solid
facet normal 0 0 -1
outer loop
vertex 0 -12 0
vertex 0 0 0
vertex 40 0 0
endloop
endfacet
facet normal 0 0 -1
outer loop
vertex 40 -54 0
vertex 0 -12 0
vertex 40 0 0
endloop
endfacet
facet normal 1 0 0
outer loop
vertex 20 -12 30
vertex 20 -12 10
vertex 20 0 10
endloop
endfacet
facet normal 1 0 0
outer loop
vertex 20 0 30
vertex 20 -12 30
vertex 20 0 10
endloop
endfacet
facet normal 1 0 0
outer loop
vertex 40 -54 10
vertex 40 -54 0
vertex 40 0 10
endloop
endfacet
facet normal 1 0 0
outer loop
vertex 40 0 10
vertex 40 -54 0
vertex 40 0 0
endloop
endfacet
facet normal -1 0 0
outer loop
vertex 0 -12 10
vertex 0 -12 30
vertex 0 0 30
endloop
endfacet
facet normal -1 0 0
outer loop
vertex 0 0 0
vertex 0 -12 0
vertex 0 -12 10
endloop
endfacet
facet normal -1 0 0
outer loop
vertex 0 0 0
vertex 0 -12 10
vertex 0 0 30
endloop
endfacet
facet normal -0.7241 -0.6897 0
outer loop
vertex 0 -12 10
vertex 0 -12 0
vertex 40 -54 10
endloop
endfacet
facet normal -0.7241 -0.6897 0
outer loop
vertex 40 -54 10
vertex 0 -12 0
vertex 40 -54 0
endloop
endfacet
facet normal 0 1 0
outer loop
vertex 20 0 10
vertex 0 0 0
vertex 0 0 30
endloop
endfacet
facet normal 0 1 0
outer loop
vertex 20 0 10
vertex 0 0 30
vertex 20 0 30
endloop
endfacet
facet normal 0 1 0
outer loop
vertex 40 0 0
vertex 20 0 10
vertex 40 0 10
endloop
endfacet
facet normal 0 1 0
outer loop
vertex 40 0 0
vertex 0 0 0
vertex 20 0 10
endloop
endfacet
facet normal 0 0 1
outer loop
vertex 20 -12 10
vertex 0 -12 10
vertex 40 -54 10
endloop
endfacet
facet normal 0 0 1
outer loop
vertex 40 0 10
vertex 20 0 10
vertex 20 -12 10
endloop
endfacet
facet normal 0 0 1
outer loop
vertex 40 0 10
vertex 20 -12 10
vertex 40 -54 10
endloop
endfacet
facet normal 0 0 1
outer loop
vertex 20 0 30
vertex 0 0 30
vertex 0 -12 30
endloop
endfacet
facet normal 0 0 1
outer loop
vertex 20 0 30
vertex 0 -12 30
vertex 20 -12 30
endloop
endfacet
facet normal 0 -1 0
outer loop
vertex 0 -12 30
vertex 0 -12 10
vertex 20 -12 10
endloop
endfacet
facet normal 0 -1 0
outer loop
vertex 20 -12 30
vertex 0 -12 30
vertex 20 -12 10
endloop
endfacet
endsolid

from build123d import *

# Parameters (mm, degrees)
BOSS_EXTRUDE1_DEPTH = 10
SKETCH1_4_W         = 20
SKETCH1_4_H         = 12
BOSS_EXTRUDE2_DEPTH = 30


with BuildPart() as part:
    # Sketch1 → Boss-Extrude1 (new body)
    with BuildSketch(Plane.XY):
        Polygon((20, -12), (0, -12), (40, -54), (40, 0), (20, 0), align=None)
    extrude(amount=BOSS_EXTRUDE1_DEPTH)

    # Sketch1<4> → Boss-Extrude2 (add)
    with BuildSketch(Plane.XY):
        with Locations((10, -6)):
            Rectangle(SKETCH1_4_W, SKETCH1_4_H)
    extrude(amount=BOSS_EXTRUDE2_DEPTH)


solid = part.part
